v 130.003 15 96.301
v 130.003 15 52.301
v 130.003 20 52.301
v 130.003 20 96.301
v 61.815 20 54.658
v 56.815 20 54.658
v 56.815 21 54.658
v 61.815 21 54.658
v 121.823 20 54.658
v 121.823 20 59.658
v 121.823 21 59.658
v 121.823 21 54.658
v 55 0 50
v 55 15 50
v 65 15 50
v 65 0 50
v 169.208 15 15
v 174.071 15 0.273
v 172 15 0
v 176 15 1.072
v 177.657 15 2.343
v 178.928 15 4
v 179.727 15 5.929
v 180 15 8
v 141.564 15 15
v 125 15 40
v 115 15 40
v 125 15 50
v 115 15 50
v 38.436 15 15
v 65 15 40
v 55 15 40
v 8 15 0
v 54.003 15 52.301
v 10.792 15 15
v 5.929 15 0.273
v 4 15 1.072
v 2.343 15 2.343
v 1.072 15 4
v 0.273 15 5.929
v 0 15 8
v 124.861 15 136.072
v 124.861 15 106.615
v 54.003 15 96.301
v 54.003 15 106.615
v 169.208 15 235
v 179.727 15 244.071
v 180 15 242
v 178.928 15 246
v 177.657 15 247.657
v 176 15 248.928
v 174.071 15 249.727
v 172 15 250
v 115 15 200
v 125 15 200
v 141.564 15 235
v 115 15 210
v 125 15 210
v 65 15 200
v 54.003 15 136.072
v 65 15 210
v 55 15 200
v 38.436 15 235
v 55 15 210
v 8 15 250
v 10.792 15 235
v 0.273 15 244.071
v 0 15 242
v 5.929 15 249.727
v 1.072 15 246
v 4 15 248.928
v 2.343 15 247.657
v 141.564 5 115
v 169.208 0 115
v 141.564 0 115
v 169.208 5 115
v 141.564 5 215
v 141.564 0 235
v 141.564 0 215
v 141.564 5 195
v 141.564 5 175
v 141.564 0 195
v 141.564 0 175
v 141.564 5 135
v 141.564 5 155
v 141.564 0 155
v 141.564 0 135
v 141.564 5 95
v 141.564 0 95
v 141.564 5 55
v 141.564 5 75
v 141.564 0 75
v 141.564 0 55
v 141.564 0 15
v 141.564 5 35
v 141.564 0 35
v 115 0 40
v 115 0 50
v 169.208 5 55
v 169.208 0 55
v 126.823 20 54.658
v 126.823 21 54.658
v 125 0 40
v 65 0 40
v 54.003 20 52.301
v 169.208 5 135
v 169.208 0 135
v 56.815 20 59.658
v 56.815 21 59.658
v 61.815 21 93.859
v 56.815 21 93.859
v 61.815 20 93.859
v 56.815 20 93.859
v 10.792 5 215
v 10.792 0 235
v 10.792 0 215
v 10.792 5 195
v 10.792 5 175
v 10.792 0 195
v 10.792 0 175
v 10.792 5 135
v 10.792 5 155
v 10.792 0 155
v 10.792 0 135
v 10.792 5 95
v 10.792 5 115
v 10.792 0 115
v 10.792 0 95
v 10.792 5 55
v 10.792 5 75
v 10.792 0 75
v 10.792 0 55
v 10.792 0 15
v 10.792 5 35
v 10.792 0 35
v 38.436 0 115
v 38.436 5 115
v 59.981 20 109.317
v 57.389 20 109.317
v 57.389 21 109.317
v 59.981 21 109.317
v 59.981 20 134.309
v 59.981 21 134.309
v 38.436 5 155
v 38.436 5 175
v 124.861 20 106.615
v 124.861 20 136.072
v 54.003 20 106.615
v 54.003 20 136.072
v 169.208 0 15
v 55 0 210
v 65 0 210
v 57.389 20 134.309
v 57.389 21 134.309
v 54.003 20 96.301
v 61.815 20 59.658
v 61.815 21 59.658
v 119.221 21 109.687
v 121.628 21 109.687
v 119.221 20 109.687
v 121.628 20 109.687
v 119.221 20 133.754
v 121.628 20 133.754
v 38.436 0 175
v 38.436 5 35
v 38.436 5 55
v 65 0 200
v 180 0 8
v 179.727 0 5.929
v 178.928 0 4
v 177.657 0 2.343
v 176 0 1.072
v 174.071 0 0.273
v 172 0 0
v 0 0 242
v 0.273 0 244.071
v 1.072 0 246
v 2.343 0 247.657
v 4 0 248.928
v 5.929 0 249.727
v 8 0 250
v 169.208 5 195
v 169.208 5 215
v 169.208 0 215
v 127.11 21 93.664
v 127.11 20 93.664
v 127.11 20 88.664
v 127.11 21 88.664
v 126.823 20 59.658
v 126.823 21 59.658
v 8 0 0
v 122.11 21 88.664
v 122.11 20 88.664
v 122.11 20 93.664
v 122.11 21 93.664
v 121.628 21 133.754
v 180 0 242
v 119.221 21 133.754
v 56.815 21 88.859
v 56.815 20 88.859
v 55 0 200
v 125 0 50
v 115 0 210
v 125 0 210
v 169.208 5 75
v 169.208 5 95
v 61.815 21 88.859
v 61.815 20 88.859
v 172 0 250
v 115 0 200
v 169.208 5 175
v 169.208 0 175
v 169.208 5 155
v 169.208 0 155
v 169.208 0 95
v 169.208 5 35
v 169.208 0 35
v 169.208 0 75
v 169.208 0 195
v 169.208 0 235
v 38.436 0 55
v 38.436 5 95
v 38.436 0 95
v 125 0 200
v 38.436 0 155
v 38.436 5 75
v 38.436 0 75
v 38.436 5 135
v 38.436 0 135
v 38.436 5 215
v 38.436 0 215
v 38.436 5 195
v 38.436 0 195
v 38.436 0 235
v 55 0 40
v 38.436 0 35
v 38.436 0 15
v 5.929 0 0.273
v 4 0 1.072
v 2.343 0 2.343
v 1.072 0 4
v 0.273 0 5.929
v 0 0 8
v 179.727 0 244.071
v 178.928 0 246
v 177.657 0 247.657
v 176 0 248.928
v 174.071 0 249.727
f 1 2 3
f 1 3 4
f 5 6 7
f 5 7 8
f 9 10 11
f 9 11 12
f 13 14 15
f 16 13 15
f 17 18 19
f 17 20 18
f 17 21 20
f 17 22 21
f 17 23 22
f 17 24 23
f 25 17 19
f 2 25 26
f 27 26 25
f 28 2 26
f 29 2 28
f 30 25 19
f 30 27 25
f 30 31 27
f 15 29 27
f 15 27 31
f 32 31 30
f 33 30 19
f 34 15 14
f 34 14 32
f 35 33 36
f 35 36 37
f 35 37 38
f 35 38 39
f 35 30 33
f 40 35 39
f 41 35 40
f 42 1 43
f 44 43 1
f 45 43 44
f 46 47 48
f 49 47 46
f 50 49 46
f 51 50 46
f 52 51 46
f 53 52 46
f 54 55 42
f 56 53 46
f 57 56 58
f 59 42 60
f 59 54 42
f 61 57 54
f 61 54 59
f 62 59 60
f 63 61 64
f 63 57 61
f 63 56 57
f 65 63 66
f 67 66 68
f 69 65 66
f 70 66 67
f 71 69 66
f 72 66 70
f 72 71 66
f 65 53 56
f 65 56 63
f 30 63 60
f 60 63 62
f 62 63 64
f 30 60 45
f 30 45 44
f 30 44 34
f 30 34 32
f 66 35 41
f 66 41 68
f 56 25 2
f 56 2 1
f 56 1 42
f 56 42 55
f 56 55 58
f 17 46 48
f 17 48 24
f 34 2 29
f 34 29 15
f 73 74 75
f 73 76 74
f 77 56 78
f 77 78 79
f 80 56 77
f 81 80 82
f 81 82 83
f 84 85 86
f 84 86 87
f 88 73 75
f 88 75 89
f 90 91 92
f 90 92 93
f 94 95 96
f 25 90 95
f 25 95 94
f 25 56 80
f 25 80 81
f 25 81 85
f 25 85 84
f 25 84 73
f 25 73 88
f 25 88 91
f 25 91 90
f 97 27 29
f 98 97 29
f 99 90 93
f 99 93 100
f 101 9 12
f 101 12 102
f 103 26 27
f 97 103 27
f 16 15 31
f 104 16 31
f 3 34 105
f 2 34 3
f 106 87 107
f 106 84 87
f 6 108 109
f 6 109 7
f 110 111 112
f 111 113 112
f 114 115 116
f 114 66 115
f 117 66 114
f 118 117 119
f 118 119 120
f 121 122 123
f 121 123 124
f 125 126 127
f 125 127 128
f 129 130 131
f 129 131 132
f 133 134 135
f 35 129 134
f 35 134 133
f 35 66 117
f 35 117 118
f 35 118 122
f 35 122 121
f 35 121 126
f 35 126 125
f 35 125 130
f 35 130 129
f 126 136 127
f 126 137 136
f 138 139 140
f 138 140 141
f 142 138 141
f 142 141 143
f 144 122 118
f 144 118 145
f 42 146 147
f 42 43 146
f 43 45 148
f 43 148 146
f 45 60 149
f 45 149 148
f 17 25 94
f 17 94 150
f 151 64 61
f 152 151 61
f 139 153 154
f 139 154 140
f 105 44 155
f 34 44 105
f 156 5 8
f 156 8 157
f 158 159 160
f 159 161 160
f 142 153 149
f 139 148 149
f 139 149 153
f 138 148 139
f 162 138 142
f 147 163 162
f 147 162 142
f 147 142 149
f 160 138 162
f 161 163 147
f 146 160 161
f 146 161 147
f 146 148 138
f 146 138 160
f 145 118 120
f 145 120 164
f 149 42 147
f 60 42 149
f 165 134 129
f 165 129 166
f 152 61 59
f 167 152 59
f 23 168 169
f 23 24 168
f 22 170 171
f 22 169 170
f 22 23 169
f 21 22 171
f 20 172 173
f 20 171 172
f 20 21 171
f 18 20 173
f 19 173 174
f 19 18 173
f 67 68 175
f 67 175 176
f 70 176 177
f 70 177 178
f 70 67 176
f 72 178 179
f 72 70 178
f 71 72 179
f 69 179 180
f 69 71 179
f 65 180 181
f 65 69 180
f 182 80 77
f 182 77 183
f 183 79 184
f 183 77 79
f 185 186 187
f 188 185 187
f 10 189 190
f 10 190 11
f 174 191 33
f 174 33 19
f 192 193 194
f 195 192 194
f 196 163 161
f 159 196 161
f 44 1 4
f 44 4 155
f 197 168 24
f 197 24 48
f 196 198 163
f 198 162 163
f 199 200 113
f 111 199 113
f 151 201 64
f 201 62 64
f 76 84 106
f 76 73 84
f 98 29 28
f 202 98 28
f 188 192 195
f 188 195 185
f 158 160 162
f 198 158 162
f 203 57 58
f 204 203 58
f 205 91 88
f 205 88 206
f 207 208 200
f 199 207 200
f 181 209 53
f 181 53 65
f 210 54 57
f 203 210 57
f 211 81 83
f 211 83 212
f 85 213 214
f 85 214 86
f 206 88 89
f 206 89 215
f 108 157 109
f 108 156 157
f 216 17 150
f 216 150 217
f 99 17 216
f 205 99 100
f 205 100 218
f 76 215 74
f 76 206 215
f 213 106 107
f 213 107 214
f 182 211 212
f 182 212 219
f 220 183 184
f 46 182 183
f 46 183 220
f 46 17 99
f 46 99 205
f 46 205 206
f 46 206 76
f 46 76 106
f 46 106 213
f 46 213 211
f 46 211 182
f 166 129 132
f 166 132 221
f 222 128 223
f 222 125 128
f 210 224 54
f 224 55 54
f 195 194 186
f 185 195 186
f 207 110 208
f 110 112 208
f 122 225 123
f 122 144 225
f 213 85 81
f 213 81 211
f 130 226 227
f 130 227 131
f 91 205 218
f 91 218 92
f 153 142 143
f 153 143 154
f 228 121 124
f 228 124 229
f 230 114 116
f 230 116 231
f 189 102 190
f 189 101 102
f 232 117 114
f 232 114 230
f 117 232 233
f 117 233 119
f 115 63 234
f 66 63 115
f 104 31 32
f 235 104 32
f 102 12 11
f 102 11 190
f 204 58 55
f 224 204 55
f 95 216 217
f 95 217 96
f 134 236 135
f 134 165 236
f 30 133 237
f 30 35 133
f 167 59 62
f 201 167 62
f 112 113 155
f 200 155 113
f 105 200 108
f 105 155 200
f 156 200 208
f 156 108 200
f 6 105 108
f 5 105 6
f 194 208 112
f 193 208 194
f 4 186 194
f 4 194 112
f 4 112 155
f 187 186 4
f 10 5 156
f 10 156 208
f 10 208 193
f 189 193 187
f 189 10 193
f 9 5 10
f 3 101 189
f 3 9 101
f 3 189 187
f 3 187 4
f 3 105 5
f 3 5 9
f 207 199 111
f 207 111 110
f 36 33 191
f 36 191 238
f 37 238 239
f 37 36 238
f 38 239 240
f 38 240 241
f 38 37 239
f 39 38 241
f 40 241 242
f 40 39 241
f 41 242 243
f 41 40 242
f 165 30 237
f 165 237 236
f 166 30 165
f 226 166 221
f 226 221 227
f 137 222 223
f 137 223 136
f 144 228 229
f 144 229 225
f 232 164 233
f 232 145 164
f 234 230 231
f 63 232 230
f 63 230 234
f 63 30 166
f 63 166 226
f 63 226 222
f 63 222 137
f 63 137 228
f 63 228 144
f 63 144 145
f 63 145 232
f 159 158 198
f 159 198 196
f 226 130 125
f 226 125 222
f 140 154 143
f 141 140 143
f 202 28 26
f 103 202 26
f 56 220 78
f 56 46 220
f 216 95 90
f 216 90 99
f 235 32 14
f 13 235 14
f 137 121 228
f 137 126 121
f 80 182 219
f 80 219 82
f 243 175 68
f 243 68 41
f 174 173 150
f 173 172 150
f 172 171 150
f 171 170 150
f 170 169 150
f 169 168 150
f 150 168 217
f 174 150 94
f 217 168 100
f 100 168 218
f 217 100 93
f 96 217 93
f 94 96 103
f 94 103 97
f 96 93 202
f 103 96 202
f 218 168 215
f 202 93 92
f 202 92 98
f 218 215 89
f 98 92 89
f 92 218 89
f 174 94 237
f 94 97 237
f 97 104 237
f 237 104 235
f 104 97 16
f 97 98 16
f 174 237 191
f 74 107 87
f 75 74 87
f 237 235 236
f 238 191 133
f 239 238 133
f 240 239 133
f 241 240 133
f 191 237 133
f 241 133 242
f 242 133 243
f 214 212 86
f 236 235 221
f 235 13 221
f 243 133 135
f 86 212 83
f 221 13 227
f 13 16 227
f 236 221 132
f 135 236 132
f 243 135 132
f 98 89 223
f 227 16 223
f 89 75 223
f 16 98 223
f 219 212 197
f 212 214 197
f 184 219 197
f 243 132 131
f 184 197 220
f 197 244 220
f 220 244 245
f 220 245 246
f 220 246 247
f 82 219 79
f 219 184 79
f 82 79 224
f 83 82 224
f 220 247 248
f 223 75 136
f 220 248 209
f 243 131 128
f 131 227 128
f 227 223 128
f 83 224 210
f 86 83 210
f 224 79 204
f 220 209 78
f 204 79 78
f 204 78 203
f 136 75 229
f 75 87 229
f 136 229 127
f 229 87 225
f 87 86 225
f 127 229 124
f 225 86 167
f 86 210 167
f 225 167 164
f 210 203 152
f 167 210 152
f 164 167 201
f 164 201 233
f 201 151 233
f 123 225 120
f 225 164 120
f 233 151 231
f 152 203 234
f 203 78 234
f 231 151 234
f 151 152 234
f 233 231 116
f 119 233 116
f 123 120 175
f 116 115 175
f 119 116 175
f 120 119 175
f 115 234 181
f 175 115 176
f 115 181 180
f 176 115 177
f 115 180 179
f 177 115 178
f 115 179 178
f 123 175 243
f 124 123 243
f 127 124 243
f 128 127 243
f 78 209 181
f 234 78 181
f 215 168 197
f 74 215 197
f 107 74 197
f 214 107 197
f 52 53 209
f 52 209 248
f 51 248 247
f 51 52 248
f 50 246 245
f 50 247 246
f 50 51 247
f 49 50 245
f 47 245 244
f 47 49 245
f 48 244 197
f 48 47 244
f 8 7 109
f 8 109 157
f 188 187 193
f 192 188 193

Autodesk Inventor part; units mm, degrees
ref_plane "YZ Plane" through (0, 0, 0) normal (1, 0, 0) x (0, 1, 0)
ref_plane "XZ Plane" through (0, 0, 0) normal (0, 1, 0) x (-1, 0, 0)
sketch "Skizze1" plane through (0, 0, 0) normal (0, 1, 0) x (-1, 0, 0)
  point P0 (0, 0)
sketch "Skizze2" plane through (0, 0, 0) normal (0, 1, 0) x (-1, 0, 0)
  line L0 (0, 0) -> (-180, 0)
  line L1 (-180, 0) -> (-180, 250)
  line L2 (-180, 250) -> (0, 250)
  line L3 (0, 250) -> (0, 0)
  dimension "d0" = 180
  dimension "d1" = 250
extrude "Extrusion1" add sketch "Skizze2" along normal blind 15
sketch "Skizze3" plane through (0, 15, 0) normal (0, 1, 0) x (1, 0, 0)
  line L0 (10.7918, -15) -> (38.4358, -15)
  line L1 (38.4358, -15) -> (38.4358, -235)
  line L2 (38.4358, -235) -> (10.7918, -235)
  line L3 (10.7918, -235) -> (10.7918, -15)
  line L4 (0, -250) -> (180, -250) projected
  point P0 (0, 0)
  point P1 (24.6138, -15)
  point P2 (24.6138, -235)
  dimension "d79" = 220
  dimension "d80" = 15
extrude "Extrusion2" cut sketch "Skizze3" against normal blind 10
sketch "Skizze4" plane through (0, 15, 0) normal (0, 1, 0) x (1, 0, 0)
  line L0 (54.0028, -52.3007) -> (130.0028, -52.3007)
  line L1 (130.0028, -52.3007) -> (130.0028, -96.3007)
  line L2 (130.0028, -96.3007) -> (54.0028, -96.3007)
  line L3 (54.0028, -96.3007) -> (54.0028, -52.3007)
  point P0 (0, 0)
  dimension "d6" = 76
  dimension "d7" = 44
extrude "Extrusion3" add sketch "Skizze4" along normal blind 5
sketch "Skizze5" plane through (0, 15, 0) normal (0, 1, 0) x (1, 0, 0)
  line L0 (56.8154, -93.8586) -> (61.8154, -93.8586)
  line L1 (61.8154, -93.8586) -> (61.8154, -88.8586)
  line L2 (61.8154, -88.8586) -> (56.8154, -88.8586)
  line L3 (56.8154, -88.8586) -> (56.8154, -93.8586)
  line L4 (56.8154, -55.8667) -> (61.8154, -55.8667)
  line L5 (61.8154, -55.8667) -> (61.8154, -60.8667)
  line L6 (61.8154, -60.8667) -> (56.8154, -60.8667)
  line L7 (56.8154, -60.8667) -> (56.8154, -55.8667)
  point P0 (0, 0)
  dimension "d10" = 5
  dimension "d11" = 5
  dimension "d12" = 5
extrude "Extrusion4" add sketch "Skizze5" along normal blind 6 contours L3 L2 L1 L0
sketch "Skizze6" plane through (0, 20, 0) normal (0, 1, 0) x (1, 0, 0)
  line L0 (61.8154, -59.6582) -> (56.8154, -59.6582)
  line L1 (56.8154, -59.6582) -> (56.8154, -54.6582)
  line L2 (56.8154, -54.6582) -> (61.8154, -54.6582)
  line L3 (61.8154, -54.6582) -> (61.8154, -59.6582)
  point P0 (0, 0)
  dimension "d15" = 5
extrude "Extrusion5" add sketch "Skizze6" along normal blind 1
sketch "Skizze7" plane through (0, 20, 0) normal (0, 1, 0) x (1, 0, 0)
  line L0 (121.8231, -54.6582) -> (126.8231, -54.6582)
  line L1 (126.8231, -54.6582) -> (126.8231, -59.6582)
  line L2 (126.8231, -59.6582) -> (121.8231, -59.6582)
  line L3 (121.8231, -59.6582) -> (121.8231, -54.6582)
  point P0 (0, 0)
  dimension "d18" = 5
extrude "Extrusion6" add sketch "Skizze7" along normal blind 1
sketch "Skizze8" plane through (0, 20, 0) normal (0, 1, 0) x (1, 0, 0)
  line L0 (122.1095, -93.6637) -> (127.1095, -93.6637)
  line L1 (127.1095, -93.6637) -> (127.1095, -88.6637)
  line L2 (127.1095, -88.6637) -> (122.1095, -88.6637)
  line L3 (122.1095, -88.6637) -> (122.1095, -93.6637)
  point P0 (0, 0)
  point P1 (124.6095, -93.6637)
  point P2 (124.6095, -88.6637)
  dimension "d21" = 5
  dimension "d22" = 5
extrude "Extrusion7" add sketch "Skizze8" along normal blind 1
sketch "Skizze9" plane through (0, 15, 0) normal (0, 1, 0) x (1, 0, 0)
  line L0 (54.0028, -106.6154) -> (124.8609, -106.6154)
  line L1 (124.8609, -106.6154) -> (124.8609, -136.072)
  line L2 (124.8609, -136.072) -> (54.0028, -136.072)
  line L3 (54.0028, -136.072) -> (54.0028, -106.6154)
  line L4 (130.0028, -52.3007) -> (54.0028, -52.3007) projected
  line L5 (54.0028, -96.3007) -> (130.0028, -96.3007) projected
  line L6 (0, -250) -> (180, -250) projected
  point P0 (0, 0)
  point P1 (89.4318, -136.072)
  dimension "d182" = 83.7713
  dimension "d183" = 10.3146
  dimension "d184" = 113.928
  dimension "d185" = 113.928
extrude "Extrusion8" add sketch "Skizze9" along normal blind 5
sketch "Skizze10" plane through (0, 20, 0) normal (0, 1, 0) x (1, 0, 0)
  line L0 (57.3891, -109.317) -> (59.9809, -109.317)
  line L1 (59.9809, -109.317) -> (59.9809, -134.3091)
  line L2 (59.9809, -134.3091) -> (57.3891, -134.3091)
  line L3 (57.3891, -134.3091) -> (57.3891, -109.317)
  point P0 (0, 0)
extrude "Extrusion9" add sketch "Skizze10" along normal blind 1
sketch "Skizze11" plane through (0, 20, 0) normal (0, 1, 0) x (1, 0, 0)
  line L0 (121.6279, -109.6873) -> (119.2213, -109.6873)
  line L1 (119.2213, -109.6873) -> (119.2213, -133.7537)
  line L2 (119.2213, -133.7537) -> (121.6279, -133.7537)
  line L3 (121.6279, -133.7537) -> (121.6279, -109.6873)
  point P0 (0, 0)
extrude "Extrusion10" add sketch "Skizze11" along normal blind 1
sketch "Skizze14" plane through (0, 5, 0) normal (0, 1, 0) x (1, 0, 0)
  line L0 (10.7918, -235) -> (10.7918, -15) projected
  line L1 (38.4358, -15) -> (38.4358, -235) projected
  line L2 (10.7918, -15) -> (38.4358, -15)
  line L3 (38.4358, -15) -> (38.4358, -35)
  line L4 (38.4358, -35) -> (10.7918, -35)
  line L5 (10.7918, -35) -> (10.7918, -15)
  line L6 (10.7918, -55) -> (38.4358, -55)
  line L7 (38.4358, -55) -> (38.4358, -75)
  line L8 (38.4358, -75) -> (10.7918, -75)
  line L9 (10.7918, -75) -> (10.7918, -55)
  line L10 (10.7918, -95) -> (38.4358, -95)
  line L11 (38.4358, -95) -> (38.4358, -115)
  line L12 (38.4358, -115) -> (10.7918, -115)
  line L13 (10.7918, -115) -> (10.7918, -95)
  line L14 (10.7918, -135) -> (38.4358, -135)
  line L15 (38.4358, -135) -> (38.4358, -155)
  line L16 (38.4358, -155) -> (10.7918, -155)
  line L17 (10.7918, -155) -> (10.7918, -135)
  line L18 (10.7918, -175) -> (38.4358, -175)
  line L19 (38.4358, -175) -> (38.4358, -195)
  line L20 (38.4358, -195) -> (10.7918, -195)
  line L21 (10.7918, -195) -> (10.7918, -175)
  line L22 (10.7918, -215) -> (38.4358, -215)
  line L23 (38.4358, -215) -> (38.4358, -235)
  line L24 (38.4358, -235) -> (10.7918, -235)
  line L25 (10.7918, -235) -> (10.7918, -215)
  point P0 (0, 0)
  point P1 (24.6138, -55)
  point P2 (24.6138, -35)
  point P3 (24.6138, -95)
  point P4 (24.6138, -135)
  point P5 (24.6138, -175)
  point P6 (24.6138, -155)
  point P7 (24.6138, -215)
  point P8 (24.6138, -195)
  point P9 (10.7918, -235)
  point P10 (38.4358, -215)
  point P11 (10.7918, -195)
  point P12 (38.4358, -175)
  point P13 (10.7918, -155)
  point P14 (38.4358, -135)
  point P15 (10.7918, -115)
  point P16 (38.4358, -95)
  point P17 (10.7918, -75)
  point P18 (38.4358, -55)
  point P19 (10.7918, -55)
  point P20 (10.7918, -35)
  dimension "d42" = 20
  dimension "d43" = 20
  dimension "d44" = 20
  dimension "d45" = 20
  dimension "d46" = 20
  dimension "d47" = 20
  dimension "d48" = 20
  dimension "d49" = 20
  dimension "d50" = 20
  dimension "d51" = 20
  dimension "d52" = 20
extrude "Extrusion12" cut sketch "Skizze14" against normal blind 20 contours L0 L22 L1 L24 | L0 L18 L1 L20 | L0 L14 L1 L16 | L0 L10 L1 L12 | L0 L6 L1 L8 | L0 L2 L1 L4
ref_plane "Arbeitsebene1" through (90, 0, 250) normal (1, 0, 0) x (0, 0, -1)
mirror "Spiegeln1" about plane through (90, 0, 250) normal (1, 0, 0) of "Extrusion12"
mirror "Spiegeln2" about plane through (90, 0, 250) normal (1, 0, 0) of "Extrusion2"
sketch "Skizze15" plane through (0, 15, 0) normal (0, 1, 0) x (1, 0, 0)
  line L0 (55, -210) -> (65, -210)
  line L1 (65, -210) -> (65, -200)
  line L2 (65, -200) -> (55, -200)
  line L3 (55, -200) -> (55, -210)
  line L4 (115, -210) -> (125, -210)
  line L5 (125, -210) -> (125, -200)
  line L6 (125, -200) -> (115, -200)
  line L7 (115, -200) -> (115, -210)
  line L8 (0, -250) -> (180, -250) projected
  line L9 (55, -50) -> (65, -50)
  line L10 (65, -50) -> (65, -40)
  line L11 (65, -40) -> (55, -40)
  line L12 (55, -40) -> (55, -50)
  line L13 (115, -50) -> (125, -50)
  line L14 (125, -50) -> (125, -40)
  line L15 (125, -40) -> (115, -40)
  line L16 (115, -40) -> (115, -50)
  line L17 (0, 0) -> (0, -250) projected
  line L18 (180, -250) -> (180, 0) projected
  line L19 (180, 0) -> (0, 0) projected
  point P0 (120, -210)
  point P1 (60, -50)
  point P2 (120, -50)
  point P3 (55, -205)
  point P4 (125, -205)
  point P5 (55, -45)
  point P6 (125, -45)
  point P7 (60, -210)
  point P8 (60, -40)
  point P9 (120, -40)
  dimension "d56" = 10
  dimension "d57" = 10
  dimension "d58" = 10
  dimension "d59" = 10
  dimension "d60" = 40
  dimension "d61" = 10
  dimension "d62" = 10
  dimension "d63" = 10
  dimension "d64" = 10
  dimension "d72" = 55
  dimension "d73" = 55
  dimension "d74" = 55
  dimension "d75" = 55
  dimension "d76" = 40
  dimension "d77" = 40
  dimension "d78" = 40
extrude "Extrusion13" cut sketch "Skizze15" against normal blind 20 contours L3 L2 L1 L0 | L7 L6 L5 L4 | L12 L11 L10 L9 | L16 L15 L14 L13
fillet "Rundung9" radius 8 4 edges at (180, 7.5, 250) (180, 7.5, 0) (0, 7.5, 0) (0, 7.5, 250)
properties part number "WRO Modell_RC_Auto_3"
